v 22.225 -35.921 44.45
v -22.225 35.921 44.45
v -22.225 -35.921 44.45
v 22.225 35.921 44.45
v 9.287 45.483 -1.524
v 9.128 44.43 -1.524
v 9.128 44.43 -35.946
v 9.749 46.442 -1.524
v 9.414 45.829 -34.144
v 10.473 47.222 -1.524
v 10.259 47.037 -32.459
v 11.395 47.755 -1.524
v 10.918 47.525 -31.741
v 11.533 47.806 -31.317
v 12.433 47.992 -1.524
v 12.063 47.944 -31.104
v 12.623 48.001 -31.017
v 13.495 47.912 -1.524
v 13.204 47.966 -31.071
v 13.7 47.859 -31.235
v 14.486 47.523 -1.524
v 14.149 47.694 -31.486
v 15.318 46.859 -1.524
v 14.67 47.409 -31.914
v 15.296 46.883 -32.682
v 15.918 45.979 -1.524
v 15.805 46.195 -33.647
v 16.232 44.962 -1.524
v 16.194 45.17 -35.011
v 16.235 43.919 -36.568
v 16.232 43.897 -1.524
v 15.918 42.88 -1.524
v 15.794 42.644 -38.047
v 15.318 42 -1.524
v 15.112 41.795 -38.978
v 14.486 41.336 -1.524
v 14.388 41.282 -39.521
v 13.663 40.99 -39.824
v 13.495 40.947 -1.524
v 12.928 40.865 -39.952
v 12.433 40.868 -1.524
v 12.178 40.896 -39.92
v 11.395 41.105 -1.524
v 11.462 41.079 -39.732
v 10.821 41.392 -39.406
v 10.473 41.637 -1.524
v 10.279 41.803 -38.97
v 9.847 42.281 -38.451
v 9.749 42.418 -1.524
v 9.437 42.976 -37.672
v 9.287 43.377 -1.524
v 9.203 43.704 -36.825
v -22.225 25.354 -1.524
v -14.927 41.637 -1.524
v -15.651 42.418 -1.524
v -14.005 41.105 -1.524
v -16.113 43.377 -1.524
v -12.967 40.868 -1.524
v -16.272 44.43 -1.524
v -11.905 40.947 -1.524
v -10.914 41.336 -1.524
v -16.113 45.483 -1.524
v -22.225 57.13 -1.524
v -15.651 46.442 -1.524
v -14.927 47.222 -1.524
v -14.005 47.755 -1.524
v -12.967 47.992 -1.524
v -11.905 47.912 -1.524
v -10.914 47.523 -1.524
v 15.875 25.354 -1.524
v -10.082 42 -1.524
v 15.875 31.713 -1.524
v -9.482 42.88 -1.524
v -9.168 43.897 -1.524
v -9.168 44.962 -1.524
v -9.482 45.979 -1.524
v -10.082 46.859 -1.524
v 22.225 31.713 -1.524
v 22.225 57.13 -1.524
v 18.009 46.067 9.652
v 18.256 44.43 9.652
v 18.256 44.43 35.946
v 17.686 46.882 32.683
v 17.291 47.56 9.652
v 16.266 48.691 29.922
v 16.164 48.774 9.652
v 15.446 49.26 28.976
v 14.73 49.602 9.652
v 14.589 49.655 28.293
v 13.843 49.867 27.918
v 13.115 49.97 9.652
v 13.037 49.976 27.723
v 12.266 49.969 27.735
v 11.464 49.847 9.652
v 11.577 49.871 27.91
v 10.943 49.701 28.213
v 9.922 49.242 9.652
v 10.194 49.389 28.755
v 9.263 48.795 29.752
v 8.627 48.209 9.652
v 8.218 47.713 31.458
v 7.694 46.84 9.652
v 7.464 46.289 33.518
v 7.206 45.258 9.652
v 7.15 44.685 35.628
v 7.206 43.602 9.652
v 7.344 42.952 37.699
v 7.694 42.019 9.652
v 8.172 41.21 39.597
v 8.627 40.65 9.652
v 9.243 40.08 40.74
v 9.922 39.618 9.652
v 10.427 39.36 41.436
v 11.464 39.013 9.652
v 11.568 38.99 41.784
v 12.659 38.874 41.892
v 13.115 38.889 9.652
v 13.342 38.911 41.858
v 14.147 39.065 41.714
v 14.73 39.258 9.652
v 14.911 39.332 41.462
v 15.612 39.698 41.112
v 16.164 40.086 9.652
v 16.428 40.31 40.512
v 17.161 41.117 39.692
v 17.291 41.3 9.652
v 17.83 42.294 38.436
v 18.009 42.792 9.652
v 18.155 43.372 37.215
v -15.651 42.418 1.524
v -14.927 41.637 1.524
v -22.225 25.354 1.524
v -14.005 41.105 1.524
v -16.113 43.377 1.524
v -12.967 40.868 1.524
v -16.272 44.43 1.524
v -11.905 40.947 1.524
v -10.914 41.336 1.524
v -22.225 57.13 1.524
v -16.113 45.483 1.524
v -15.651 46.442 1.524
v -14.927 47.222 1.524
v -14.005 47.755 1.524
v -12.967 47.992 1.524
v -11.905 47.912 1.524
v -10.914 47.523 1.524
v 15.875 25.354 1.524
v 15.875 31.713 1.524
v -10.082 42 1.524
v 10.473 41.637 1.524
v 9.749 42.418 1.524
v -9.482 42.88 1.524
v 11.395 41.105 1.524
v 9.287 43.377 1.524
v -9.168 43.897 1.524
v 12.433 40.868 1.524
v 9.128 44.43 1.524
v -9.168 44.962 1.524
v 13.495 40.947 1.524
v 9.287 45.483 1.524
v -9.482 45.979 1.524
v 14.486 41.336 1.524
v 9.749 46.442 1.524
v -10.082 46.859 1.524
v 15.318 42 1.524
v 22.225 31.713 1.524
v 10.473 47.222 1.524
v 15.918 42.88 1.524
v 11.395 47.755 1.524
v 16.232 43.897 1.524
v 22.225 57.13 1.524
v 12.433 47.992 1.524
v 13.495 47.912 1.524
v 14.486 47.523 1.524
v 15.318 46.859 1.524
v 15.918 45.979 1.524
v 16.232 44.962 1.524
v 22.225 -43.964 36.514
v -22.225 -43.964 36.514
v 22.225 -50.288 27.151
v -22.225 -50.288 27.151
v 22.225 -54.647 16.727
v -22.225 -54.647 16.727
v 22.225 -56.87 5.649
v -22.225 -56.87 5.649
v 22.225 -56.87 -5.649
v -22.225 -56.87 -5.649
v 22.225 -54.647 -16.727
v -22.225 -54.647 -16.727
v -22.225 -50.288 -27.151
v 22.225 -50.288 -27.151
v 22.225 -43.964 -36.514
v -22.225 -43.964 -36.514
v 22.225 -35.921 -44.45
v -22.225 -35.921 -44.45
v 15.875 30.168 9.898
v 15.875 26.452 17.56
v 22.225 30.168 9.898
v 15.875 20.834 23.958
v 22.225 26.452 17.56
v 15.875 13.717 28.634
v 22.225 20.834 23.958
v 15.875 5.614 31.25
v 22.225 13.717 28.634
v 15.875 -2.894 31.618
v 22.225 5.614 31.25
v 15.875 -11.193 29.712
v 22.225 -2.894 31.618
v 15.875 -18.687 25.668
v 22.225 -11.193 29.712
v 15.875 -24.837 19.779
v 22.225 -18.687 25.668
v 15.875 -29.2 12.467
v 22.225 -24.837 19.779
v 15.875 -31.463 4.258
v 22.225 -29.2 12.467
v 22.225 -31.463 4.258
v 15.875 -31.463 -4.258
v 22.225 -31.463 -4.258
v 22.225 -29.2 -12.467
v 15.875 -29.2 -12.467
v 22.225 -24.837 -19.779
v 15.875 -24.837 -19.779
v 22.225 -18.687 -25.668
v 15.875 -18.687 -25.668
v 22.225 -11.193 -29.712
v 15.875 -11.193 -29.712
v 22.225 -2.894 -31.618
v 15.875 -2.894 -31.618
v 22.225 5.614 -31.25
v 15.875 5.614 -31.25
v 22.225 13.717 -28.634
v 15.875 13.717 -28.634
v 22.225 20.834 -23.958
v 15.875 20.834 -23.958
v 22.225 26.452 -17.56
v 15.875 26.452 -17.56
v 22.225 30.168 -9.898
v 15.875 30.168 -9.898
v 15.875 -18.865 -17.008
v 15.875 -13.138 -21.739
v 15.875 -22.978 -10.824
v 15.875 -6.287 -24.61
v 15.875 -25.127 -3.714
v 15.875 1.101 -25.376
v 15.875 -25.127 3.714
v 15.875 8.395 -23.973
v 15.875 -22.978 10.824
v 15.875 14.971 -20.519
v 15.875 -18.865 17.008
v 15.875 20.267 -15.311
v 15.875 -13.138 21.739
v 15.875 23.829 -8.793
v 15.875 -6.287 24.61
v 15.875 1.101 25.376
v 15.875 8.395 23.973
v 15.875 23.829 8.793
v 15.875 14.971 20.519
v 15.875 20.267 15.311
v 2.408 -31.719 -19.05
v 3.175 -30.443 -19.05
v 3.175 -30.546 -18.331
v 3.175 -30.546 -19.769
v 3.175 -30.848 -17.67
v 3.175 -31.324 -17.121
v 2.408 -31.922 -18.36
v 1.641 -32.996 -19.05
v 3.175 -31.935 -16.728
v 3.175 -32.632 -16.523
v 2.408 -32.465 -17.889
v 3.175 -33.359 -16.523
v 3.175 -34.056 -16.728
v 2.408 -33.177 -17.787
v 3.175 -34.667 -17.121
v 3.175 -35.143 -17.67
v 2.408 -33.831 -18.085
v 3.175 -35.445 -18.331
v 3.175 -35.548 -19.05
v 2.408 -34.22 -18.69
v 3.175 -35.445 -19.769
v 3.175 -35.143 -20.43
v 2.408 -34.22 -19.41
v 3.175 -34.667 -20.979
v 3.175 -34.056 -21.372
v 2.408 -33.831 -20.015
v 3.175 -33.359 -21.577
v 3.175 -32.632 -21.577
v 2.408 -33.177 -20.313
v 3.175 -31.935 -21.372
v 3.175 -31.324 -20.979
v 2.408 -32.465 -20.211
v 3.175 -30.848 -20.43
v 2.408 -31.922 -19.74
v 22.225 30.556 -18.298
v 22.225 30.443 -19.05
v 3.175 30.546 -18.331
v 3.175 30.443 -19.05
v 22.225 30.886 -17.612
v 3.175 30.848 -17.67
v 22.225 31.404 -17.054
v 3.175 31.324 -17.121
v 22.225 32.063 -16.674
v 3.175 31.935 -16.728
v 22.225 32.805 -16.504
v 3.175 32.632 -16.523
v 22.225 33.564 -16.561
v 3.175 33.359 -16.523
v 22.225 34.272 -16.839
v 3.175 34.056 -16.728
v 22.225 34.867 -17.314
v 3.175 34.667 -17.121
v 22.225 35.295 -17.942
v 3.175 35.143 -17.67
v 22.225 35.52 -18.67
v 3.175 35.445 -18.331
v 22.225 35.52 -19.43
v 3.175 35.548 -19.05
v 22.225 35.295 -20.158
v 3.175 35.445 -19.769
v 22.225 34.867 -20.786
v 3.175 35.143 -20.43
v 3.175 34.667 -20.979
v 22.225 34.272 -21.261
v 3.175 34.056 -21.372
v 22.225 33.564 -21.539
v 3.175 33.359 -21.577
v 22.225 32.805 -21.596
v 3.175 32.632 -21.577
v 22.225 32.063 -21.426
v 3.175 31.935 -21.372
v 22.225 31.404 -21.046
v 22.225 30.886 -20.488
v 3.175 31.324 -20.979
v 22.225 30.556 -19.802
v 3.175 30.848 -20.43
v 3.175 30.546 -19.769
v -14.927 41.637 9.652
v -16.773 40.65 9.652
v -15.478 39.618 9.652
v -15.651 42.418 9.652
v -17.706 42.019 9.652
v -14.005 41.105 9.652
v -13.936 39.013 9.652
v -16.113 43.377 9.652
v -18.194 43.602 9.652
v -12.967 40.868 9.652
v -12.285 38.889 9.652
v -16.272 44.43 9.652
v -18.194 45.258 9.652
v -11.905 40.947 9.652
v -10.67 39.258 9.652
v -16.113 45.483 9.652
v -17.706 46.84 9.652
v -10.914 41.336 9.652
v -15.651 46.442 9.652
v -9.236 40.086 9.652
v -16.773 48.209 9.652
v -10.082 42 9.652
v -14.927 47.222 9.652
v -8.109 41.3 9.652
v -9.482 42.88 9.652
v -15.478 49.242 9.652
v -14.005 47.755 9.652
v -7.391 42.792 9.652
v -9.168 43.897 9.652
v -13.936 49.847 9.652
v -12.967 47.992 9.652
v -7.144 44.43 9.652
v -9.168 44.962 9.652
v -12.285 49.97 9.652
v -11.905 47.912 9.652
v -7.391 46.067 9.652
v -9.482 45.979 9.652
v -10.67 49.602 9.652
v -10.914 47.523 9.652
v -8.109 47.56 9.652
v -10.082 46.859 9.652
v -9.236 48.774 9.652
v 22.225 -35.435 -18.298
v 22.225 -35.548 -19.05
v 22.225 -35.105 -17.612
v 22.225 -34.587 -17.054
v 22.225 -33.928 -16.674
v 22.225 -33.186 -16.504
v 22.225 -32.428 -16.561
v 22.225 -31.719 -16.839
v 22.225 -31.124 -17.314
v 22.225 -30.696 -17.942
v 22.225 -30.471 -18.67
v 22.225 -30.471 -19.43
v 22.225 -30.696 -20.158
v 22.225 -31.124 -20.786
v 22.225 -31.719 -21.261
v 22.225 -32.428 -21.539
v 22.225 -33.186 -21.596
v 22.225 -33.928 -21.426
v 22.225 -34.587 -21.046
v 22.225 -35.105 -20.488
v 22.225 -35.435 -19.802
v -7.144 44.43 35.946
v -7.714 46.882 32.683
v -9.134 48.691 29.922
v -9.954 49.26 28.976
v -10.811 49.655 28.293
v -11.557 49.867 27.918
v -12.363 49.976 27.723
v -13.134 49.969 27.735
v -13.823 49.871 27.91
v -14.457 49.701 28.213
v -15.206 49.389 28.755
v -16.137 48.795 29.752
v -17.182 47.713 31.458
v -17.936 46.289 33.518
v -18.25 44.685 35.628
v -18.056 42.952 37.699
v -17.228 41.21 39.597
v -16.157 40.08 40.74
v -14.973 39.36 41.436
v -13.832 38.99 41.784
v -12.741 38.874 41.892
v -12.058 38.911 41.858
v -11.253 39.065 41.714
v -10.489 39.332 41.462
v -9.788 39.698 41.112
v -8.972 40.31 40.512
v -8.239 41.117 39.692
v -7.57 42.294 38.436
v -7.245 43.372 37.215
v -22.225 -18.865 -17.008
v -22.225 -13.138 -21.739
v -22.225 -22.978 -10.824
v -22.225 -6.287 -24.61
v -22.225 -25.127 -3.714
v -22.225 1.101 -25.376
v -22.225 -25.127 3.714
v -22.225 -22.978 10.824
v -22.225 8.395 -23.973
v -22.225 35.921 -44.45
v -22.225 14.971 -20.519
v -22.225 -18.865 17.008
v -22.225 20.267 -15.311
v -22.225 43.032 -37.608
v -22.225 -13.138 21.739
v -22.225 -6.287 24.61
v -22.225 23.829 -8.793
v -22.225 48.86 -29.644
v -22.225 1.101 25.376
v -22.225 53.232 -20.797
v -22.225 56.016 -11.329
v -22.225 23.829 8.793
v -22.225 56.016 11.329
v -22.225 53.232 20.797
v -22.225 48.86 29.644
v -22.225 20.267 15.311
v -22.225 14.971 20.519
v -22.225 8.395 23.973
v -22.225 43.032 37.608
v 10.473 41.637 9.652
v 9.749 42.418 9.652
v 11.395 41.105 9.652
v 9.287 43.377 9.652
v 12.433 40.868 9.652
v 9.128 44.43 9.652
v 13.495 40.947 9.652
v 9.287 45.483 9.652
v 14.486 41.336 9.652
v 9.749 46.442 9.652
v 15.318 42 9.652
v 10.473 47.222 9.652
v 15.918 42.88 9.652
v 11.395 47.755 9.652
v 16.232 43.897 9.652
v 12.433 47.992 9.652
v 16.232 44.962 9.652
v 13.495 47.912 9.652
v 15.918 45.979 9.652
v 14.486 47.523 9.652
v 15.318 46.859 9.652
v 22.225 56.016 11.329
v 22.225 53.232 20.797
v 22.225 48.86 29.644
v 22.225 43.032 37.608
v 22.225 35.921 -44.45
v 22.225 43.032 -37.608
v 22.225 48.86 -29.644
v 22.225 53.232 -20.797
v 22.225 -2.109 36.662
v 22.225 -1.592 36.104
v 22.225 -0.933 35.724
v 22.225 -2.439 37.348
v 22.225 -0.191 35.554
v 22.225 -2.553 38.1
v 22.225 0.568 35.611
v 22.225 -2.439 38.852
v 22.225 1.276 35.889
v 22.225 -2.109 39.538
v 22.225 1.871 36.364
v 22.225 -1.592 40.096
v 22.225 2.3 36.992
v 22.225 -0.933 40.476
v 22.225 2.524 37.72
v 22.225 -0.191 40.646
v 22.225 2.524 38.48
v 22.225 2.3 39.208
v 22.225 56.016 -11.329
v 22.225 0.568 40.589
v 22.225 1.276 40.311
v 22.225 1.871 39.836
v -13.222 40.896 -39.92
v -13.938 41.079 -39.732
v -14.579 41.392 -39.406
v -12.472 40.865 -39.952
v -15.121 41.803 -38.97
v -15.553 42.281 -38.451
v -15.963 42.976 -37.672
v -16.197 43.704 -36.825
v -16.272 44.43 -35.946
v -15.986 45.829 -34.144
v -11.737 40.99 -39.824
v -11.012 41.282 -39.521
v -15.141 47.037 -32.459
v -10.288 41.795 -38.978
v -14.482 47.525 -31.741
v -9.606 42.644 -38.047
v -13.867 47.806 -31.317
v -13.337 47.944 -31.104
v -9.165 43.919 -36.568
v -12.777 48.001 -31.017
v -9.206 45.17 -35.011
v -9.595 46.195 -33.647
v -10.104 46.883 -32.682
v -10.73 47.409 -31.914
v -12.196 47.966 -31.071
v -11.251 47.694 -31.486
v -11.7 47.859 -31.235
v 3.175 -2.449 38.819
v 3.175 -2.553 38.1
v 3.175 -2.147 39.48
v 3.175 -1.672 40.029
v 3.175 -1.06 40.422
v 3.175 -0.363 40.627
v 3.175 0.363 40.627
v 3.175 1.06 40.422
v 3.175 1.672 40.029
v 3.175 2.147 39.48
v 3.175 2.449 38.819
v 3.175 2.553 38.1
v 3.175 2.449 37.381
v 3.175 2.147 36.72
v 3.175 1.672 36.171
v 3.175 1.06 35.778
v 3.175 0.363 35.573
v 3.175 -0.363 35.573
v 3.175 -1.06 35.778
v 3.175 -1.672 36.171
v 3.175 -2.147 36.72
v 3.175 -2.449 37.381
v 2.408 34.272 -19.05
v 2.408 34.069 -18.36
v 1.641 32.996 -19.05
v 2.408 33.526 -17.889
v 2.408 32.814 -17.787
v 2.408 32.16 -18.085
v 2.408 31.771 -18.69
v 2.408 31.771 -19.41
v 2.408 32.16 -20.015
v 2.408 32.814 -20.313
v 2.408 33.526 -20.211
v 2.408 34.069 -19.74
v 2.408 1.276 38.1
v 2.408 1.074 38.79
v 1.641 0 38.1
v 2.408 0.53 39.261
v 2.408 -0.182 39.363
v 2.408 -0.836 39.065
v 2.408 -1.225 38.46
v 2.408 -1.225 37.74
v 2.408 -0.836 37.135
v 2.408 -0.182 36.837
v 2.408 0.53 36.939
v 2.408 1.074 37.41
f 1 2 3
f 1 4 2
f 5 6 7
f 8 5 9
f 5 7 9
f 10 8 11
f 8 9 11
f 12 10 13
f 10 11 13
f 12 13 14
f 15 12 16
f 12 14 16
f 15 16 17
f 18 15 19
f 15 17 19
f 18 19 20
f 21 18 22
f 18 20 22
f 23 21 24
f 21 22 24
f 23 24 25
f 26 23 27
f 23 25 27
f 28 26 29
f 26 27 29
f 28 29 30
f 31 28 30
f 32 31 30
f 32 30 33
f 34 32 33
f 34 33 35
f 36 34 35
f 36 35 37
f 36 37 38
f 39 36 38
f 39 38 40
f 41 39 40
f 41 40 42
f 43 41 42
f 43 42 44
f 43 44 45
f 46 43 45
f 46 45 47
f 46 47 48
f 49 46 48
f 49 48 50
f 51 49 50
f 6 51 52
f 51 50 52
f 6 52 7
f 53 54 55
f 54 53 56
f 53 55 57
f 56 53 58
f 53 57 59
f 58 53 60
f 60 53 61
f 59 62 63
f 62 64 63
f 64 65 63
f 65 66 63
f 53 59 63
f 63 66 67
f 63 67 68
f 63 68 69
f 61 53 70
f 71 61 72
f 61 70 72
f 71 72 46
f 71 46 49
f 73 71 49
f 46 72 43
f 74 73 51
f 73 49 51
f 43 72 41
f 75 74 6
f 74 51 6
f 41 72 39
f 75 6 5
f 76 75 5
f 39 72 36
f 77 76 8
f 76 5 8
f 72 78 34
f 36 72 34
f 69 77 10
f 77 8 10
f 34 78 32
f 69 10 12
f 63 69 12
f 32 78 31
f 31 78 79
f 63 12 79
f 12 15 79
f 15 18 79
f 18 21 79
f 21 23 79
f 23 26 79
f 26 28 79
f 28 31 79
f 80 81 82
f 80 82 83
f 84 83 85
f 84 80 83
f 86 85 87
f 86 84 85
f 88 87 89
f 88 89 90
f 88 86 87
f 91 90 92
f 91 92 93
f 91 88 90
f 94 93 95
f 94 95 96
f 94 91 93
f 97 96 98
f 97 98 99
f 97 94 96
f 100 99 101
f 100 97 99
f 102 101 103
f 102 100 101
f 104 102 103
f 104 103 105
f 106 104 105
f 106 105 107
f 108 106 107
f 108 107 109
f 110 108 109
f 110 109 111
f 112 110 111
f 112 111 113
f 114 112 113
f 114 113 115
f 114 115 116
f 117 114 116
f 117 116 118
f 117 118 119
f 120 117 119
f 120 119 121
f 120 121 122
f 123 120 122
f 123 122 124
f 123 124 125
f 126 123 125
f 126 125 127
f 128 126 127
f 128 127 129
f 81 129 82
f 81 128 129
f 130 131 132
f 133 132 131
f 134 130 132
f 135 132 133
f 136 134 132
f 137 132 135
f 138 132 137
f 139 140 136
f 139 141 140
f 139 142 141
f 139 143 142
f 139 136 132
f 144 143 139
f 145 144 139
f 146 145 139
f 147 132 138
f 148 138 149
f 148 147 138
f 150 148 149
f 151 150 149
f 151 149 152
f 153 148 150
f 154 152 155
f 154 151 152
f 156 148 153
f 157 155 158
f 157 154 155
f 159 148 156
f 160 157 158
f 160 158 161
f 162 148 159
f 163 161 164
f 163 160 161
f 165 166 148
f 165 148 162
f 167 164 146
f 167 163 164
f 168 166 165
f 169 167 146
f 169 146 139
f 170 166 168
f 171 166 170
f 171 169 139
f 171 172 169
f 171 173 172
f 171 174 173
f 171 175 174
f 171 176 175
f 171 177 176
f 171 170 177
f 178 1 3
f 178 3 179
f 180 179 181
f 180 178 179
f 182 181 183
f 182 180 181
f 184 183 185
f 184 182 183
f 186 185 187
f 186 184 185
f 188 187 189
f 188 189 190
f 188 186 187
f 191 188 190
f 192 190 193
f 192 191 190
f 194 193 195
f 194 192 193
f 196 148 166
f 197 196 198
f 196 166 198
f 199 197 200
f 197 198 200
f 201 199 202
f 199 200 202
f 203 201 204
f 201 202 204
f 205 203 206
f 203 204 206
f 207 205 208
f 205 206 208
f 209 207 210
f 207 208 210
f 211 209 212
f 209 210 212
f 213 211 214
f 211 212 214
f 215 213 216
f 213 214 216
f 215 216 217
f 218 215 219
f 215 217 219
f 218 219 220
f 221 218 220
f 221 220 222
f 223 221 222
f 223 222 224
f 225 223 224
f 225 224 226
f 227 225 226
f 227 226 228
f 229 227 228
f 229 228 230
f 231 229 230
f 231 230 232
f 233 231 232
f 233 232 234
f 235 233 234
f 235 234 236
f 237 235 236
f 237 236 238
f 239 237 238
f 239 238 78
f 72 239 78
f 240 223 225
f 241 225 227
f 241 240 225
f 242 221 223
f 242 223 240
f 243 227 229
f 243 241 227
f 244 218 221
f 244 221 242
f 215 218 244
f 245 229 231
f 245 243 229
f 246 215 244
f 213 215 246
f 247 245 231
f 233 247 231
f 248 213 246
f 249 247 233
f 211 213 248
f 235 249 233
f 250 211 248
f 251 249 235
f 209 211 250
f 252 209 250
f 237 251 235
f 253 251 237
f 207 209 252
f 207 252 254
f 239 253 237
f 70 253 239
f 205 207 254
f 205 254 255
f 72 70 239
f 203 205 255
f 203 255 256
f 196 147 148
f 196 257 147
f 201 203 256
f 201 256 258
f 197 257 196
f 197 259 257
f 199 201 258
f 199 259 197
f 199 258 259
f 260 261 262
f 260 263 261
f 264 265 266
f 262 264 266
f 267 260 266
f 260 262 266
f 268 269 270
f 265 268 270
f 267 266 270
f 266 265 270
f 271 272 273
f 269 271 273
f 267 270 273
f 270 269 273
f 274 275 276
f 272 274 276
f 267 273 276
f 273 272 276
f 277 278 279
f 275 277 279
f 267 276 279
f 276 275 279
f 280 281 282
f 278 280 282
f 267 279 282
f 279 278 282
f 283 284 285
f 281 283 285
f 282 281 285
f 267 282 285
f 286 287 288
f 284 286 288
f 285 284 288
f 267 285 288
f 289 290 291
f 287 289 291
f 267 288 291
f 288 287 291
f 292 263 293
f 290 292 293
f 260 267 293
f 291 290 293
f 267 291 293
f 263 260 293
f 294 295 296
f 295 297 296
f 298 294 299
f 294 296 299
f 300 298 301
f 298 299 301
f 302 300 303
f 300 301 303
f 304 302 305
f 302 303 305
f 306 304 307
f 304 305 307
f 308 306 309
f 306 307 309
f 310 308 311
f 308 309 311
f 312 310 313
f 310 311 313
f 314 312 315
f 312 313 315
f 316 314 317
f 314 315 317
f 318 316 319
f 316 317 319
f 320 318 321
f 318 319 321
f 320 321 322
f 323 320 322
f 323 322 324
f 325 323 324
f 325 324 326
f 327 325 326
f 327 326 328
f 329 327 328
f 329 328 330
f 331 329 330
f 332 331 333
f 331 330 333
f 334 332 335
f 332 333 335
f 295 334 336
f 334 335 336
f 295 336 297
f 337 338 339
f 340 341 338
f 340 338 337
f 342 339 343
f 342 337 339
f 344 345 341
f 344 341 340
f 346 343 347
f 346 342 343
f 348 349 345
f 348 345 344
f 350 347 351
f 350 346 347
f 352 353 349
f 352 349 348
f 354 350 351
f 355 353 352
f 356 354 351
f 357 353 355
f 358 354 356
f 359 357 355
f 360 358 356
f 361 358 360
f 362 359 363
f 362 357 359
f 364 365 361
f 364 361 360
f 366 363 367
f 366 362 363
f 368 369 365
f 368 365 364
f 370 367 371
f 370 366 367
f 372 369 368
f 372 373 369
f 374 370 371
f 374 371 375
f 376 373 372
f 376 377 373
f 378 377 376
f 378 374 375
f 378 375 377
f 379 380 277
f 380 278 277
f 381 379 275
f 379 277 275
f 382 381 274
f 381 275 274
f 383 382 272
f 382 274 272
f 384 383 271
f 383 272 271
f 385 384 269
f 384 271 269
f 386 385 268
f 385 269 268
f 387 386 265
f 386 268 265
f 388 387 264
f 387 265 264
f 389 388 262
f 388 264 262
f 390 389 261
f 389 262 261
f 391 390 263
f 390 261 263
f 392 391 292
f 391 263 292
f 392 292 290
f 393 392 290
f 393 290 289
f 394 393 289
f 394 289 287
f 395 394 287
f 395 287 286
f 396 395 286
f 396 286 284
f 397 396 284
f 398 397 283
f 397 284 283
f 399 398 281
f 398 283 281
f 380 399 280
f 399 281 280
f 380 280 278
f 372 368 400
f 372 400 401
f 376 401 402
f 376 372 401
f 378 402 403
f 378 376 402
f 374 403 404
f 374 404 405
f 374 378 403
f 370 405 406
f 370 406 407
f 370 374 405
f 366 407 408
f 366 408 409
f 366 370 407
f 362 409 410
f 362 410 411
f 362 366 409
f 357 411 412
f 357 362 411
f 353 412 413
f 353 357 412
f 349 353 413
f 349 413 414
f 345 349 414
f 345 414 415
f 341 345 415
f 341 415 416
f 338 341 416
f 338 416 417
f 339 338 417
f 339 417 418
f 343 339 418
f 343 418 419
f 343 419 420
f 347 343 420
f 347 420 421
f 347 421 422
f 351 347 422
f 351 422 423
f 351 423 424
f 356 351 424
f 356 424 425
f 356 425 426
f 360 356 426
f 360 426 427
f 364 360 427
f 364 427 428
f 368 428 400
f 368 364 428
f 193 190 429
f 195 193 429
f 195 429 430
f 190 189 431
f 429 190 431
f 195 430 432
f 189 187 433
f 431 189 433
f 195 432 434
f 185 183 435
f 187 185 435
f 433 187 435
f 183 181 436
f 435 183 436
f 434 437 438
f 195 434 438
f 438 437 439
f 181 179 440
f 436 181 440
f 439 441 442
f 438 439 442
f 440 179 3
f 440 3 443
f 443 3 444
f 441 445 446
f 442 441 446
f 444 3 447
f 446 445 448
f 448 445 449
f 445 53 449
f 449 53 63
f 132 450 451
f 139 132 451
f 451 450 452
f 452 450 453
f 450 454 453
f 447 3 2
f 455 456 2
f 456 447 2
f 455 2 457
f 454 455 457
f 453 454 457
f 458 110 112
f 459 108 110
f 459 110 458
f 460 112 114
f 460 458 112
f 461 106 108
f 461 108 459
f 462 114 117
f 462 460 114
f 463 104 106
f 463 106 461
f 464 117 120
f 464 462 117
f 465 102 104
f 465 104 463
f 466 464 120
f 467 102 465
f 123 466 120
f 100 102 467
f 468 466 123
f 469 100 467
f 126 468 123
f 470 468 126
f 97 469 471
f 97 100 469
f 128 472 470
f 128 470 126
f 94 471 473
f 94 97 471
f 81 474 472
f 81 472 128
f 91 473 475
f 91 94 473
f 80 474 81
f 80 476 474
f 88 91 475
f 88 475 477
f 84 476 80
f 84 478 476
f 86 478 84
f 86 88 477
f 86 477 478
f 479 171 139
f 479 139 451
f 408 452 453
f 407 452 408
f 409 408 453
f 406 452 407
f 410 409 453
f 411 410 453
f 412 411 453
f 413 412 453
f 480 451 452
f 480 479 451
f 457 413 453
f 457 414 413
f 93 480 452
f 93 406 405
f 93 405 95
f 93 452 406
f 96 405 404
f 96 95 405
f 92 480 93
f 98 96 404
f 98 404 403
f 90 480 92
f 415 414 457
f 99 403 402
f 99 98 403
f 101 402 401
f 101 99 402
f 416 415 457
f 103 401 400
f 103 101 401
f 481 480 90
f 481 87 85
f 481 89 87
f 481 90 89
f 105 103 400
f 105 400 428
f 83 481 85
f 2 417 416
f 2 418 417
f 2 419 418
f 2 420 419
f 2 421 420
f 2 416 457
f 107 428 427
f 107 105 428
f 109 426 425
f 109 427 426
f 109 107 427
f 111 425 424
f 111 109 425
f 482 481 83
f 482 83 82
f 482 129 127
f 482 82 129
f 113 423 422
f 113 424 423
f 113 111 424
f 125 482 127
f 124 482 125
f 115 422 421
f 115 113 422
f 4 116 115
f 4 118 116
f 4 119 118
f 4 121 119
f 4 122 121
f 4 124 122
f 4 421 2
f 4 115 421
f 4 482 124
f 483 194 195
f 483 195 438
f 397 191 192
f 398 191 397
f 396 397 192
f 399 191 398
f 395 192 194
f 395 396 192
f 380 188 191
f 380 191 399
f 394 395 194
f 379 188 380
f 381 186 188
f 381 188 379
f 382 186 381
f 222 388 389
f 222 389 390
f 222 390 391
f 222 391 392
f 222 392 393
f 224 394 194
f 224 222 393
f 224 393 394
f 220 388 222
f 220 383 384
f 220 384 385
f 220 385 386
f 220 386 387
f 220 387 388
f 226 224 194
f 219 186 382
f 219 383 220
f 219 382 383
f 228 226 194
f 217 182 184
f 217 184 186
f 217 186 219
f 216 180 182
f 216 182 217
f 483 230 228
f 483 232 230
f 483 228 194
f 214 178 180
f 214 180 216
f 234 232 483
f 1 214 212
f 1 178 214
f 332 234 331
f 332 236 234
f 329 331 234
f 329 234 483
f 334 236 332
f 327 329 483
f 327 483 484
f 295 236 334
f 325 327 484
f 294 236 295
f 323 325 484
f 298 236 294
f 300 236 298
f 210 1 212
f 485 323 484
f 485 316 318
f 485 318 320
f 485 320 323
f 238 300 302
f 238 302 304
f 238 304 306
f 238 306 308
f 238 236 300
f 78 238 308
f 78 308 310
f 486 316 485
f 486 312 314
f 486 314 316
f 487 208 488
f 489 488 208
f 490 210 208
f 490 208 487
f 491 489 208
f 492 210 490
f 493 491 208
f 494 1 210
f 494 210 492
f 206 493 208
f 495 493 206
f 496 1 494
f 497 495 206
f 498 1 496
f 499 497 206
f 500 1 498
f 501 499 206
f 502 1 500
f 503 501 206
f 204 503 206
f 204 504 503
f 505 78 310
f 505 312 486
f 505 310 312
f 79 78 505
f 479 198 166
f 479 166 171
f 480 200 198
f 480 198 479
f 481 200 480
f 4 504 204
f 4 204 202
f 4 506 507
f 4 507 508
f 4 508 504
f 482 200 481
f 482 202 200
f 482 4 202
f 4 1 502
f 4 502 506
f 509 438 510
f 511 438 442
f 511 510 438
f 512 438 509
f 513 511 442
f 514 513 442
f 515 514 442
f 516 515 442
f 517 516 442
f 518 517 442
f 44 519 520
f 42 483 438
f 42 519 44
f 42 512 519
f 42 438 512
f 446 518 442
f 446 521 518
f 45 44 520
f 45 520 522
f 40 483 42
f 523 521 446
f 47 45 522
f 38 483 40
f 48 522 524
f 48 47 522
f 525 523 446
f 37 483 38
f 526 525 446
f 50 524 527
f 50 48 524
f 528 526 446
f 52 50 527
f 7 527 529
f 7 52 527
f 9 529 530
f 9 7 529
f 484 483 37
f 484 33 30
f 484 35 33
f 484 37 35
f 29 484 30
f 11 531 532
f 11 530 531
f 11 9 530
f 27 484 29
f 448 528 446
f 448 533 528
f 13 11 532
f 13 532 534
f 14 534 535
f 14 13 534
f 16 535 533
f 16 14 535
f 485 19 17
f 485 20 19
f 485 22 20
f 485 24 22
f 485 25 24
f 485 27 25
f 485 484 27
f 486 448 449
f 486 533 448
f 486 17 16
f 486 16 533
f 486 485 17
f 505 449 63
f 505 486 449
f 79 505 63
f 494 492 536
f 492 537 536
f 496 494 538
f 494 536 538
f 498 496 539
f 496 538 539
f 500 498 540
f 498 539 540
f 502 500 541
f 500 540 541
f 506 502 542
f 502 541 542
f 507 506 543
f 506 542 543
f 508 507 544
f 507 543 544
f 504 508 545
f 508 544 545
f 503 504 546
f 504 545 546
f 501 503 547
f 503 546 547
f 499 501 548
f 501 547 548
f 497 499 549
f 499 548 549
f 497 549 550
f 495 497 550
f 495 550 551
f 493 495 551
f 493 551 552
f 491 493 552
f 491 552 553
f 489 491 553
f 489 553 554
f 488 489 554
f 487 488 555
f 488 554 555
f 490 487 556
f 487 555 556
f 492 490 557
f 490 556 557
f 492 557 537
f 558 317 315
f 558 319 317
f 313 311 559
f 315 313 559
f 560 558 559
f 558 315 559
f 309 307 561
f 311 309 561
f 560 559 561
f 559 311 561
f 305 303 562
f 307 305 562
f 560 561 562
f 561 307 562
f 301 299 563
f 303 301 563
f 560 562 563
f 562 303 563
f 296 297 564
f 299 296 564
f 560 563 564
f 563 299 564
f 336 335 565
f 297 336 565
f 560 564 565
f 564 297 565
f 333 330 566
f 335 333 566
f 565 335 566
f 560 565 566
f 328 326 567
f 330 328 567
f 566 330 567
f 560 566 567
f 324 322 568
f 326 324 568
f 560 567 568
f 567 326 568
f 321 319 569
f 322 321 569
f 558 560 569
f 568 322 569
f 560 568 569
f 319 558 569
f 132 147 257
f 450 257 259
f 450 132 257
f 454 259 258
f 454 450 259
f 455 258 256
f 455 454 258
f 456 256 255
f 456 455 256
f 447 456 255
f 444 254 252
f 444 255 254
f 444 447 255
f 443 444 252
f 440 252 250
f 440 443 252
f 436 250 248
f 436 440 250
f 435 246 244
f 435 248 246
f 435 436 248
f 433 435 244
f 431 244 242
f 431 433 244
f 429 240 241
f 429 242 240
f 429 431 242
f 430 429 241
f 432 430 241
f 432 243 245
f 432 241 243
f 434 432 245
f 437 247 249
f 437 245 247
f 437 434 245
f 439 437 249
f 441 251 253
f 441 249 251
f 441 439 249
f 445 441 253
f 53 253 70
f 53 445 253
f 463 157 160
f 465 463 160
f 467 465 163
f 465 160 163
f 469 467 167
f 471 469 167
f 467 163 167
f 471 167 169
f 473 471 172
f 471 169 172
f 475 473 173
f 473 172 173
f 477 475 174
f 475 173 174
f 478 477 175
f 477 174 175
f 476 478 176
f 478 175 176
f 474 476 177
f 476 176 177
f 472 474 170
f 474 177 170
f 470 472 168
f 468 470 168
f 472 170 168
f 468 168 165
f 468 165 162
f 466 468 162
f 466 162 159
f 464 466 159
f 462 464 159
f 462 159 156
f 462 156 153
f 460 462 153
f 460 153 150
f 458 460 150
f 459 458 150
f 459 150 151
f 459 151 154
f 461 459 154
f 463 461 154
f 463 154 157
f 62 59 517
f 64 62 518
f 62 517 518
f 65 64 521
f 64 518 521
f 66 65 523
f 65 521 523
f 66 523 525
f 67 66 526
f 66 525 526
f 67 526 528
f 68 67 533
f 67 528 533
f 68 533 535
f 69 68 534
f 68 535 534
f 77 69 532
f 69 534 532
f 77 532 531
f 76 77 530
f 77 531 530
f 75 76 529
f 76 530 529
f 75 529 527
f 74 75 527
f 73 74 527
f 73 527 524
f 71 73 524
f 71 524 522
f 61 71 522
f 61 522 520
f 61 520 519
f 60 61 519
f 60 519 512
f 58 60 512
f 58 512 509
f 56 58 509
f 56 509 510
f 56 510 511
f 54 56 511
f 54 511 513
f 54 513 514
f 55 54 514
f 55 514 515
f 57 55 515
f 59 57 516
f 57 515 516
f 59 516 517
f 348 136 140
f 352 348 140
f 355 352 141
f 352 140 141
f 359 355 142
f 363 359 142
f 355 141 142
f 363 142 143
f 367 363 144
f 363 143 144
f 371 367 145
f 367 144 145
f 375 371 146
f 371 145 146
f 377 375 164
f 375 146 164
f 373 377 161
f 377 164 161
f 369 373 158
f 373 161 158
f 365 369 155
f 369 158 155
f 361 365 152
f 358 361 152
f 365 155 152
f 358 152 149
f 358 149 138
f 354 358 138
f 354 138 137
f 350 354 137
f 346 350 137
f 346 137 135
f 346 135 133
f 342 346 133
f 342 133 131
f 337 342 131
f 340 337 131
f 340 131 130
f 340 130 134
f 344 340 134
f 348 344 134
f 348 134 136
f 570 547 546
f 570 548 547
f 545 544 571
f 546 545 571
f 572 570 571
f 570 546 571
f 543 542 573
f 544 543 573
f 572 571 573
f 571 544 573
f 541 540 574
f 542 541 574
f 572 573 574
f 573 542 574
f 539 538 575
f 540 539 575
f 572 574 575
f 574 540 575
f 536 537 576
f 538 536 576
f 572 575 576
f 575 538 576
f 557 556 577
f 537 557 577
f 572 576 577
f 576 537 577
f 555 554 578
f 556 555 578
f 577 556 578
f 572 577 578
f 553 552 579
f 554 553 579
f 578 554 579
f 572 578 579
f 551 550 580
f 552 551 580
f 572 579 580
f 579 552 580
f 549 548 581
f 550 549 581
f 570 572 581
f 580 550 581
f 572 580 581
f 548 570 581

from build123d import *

# Parameters (mm, degrees)
F0_R      = 25.4
F1_DEPTH  = 22.225
F2_R      = 31.75
F3_DEPTH  = 6.35
F4_W      = 68.9518330619
F4_H      = 1.524
F5_DEPTH  = 44.451
F7_R      = 5.55625
F8_DEPTH  = 50.8
F10_D     = 7.14375
F12_D     = 5.1054
F12_DEPTH = 19.05
F12_TIP   = 1.5338169022


with BuildPart() as f1:
    # F0 (on Right) → F1 (new body, symmetric)
    with BuildSketch(Plane.YZ):
        with BuildLine():
            Line((35.9210244843, 44.45), (-35.9210244843, 44.45))
            ThreePointArc((-35.9210244843, 44.45), (-57.15, 0), (-35.9210244843, -44.45))
            Line((-35.9210244843, -44.45), (35.9210244843, -44.45))
            ThreePointArc((35.9210244843, -44.45), (57.15, 0), (35.9210244843, 44.45))
        make_face()
        Circle(F0_R, mode=Mode.SUBTRACT)
    extrude(amount=F1_DEPTH, both=True)

    # F2 (on face) → F3 (cut)
    with BuildSketch(Plane.YZ.offset(22.225)):
        Circle(F2_R)
    extrude(amount=-F3_DEPTH, mode=Mode.SUBTRACT)

    # F4 (on face) → F5 (cut, through all)
    with BuildSketch(Plane.YZ.offset(22.225)):
        with Locations((39.5418689586, 0.762)):
            Rectangle(F4_W, F4_H)
        with Locations((39.5418689586, -0.762)):
            Rectangle(F4_W, F4_H)
    extrude(amount=-F5_DEPTH, mode=Mode.SUBTRACT)

    # F7 (on offset) → F8 (cut)
    with BuildSketch(Plane.XY.offset(9.652)):
        with Locations((12.7, 44.4296763863)):
            Circle(F7_R)
        with Locations((-12.7, 44.4296763863)):
            Circle(F7_R)
    extrude(amount=F8_DEPTH, mode=Mode.SUBTRACT)

    # F10 (through all)
    with Locations(Plane.XY.offset(9.652)):
        with Locations((-12.7, 44.4296763863), (12.7, 44.4296763863)):
            Hole(F10_D / 2)

    # F12
    with Locations(Plane.YZ.offset(22.225)):
        with Locations((0, 38.1), (32.9955678842, -19.05), (-32.9955678842, -19.05)):
            Hole(F12_D / 2, depth=F12_DEPTH)
            with Locations((0, 0, -(F12_DEPTH + F12_TIP / 2))):  # 118° drill point
                Cone(0, F12_D / 2, F12_TIP, mode=Mode.SUBTRACT)


solid = f1.part
